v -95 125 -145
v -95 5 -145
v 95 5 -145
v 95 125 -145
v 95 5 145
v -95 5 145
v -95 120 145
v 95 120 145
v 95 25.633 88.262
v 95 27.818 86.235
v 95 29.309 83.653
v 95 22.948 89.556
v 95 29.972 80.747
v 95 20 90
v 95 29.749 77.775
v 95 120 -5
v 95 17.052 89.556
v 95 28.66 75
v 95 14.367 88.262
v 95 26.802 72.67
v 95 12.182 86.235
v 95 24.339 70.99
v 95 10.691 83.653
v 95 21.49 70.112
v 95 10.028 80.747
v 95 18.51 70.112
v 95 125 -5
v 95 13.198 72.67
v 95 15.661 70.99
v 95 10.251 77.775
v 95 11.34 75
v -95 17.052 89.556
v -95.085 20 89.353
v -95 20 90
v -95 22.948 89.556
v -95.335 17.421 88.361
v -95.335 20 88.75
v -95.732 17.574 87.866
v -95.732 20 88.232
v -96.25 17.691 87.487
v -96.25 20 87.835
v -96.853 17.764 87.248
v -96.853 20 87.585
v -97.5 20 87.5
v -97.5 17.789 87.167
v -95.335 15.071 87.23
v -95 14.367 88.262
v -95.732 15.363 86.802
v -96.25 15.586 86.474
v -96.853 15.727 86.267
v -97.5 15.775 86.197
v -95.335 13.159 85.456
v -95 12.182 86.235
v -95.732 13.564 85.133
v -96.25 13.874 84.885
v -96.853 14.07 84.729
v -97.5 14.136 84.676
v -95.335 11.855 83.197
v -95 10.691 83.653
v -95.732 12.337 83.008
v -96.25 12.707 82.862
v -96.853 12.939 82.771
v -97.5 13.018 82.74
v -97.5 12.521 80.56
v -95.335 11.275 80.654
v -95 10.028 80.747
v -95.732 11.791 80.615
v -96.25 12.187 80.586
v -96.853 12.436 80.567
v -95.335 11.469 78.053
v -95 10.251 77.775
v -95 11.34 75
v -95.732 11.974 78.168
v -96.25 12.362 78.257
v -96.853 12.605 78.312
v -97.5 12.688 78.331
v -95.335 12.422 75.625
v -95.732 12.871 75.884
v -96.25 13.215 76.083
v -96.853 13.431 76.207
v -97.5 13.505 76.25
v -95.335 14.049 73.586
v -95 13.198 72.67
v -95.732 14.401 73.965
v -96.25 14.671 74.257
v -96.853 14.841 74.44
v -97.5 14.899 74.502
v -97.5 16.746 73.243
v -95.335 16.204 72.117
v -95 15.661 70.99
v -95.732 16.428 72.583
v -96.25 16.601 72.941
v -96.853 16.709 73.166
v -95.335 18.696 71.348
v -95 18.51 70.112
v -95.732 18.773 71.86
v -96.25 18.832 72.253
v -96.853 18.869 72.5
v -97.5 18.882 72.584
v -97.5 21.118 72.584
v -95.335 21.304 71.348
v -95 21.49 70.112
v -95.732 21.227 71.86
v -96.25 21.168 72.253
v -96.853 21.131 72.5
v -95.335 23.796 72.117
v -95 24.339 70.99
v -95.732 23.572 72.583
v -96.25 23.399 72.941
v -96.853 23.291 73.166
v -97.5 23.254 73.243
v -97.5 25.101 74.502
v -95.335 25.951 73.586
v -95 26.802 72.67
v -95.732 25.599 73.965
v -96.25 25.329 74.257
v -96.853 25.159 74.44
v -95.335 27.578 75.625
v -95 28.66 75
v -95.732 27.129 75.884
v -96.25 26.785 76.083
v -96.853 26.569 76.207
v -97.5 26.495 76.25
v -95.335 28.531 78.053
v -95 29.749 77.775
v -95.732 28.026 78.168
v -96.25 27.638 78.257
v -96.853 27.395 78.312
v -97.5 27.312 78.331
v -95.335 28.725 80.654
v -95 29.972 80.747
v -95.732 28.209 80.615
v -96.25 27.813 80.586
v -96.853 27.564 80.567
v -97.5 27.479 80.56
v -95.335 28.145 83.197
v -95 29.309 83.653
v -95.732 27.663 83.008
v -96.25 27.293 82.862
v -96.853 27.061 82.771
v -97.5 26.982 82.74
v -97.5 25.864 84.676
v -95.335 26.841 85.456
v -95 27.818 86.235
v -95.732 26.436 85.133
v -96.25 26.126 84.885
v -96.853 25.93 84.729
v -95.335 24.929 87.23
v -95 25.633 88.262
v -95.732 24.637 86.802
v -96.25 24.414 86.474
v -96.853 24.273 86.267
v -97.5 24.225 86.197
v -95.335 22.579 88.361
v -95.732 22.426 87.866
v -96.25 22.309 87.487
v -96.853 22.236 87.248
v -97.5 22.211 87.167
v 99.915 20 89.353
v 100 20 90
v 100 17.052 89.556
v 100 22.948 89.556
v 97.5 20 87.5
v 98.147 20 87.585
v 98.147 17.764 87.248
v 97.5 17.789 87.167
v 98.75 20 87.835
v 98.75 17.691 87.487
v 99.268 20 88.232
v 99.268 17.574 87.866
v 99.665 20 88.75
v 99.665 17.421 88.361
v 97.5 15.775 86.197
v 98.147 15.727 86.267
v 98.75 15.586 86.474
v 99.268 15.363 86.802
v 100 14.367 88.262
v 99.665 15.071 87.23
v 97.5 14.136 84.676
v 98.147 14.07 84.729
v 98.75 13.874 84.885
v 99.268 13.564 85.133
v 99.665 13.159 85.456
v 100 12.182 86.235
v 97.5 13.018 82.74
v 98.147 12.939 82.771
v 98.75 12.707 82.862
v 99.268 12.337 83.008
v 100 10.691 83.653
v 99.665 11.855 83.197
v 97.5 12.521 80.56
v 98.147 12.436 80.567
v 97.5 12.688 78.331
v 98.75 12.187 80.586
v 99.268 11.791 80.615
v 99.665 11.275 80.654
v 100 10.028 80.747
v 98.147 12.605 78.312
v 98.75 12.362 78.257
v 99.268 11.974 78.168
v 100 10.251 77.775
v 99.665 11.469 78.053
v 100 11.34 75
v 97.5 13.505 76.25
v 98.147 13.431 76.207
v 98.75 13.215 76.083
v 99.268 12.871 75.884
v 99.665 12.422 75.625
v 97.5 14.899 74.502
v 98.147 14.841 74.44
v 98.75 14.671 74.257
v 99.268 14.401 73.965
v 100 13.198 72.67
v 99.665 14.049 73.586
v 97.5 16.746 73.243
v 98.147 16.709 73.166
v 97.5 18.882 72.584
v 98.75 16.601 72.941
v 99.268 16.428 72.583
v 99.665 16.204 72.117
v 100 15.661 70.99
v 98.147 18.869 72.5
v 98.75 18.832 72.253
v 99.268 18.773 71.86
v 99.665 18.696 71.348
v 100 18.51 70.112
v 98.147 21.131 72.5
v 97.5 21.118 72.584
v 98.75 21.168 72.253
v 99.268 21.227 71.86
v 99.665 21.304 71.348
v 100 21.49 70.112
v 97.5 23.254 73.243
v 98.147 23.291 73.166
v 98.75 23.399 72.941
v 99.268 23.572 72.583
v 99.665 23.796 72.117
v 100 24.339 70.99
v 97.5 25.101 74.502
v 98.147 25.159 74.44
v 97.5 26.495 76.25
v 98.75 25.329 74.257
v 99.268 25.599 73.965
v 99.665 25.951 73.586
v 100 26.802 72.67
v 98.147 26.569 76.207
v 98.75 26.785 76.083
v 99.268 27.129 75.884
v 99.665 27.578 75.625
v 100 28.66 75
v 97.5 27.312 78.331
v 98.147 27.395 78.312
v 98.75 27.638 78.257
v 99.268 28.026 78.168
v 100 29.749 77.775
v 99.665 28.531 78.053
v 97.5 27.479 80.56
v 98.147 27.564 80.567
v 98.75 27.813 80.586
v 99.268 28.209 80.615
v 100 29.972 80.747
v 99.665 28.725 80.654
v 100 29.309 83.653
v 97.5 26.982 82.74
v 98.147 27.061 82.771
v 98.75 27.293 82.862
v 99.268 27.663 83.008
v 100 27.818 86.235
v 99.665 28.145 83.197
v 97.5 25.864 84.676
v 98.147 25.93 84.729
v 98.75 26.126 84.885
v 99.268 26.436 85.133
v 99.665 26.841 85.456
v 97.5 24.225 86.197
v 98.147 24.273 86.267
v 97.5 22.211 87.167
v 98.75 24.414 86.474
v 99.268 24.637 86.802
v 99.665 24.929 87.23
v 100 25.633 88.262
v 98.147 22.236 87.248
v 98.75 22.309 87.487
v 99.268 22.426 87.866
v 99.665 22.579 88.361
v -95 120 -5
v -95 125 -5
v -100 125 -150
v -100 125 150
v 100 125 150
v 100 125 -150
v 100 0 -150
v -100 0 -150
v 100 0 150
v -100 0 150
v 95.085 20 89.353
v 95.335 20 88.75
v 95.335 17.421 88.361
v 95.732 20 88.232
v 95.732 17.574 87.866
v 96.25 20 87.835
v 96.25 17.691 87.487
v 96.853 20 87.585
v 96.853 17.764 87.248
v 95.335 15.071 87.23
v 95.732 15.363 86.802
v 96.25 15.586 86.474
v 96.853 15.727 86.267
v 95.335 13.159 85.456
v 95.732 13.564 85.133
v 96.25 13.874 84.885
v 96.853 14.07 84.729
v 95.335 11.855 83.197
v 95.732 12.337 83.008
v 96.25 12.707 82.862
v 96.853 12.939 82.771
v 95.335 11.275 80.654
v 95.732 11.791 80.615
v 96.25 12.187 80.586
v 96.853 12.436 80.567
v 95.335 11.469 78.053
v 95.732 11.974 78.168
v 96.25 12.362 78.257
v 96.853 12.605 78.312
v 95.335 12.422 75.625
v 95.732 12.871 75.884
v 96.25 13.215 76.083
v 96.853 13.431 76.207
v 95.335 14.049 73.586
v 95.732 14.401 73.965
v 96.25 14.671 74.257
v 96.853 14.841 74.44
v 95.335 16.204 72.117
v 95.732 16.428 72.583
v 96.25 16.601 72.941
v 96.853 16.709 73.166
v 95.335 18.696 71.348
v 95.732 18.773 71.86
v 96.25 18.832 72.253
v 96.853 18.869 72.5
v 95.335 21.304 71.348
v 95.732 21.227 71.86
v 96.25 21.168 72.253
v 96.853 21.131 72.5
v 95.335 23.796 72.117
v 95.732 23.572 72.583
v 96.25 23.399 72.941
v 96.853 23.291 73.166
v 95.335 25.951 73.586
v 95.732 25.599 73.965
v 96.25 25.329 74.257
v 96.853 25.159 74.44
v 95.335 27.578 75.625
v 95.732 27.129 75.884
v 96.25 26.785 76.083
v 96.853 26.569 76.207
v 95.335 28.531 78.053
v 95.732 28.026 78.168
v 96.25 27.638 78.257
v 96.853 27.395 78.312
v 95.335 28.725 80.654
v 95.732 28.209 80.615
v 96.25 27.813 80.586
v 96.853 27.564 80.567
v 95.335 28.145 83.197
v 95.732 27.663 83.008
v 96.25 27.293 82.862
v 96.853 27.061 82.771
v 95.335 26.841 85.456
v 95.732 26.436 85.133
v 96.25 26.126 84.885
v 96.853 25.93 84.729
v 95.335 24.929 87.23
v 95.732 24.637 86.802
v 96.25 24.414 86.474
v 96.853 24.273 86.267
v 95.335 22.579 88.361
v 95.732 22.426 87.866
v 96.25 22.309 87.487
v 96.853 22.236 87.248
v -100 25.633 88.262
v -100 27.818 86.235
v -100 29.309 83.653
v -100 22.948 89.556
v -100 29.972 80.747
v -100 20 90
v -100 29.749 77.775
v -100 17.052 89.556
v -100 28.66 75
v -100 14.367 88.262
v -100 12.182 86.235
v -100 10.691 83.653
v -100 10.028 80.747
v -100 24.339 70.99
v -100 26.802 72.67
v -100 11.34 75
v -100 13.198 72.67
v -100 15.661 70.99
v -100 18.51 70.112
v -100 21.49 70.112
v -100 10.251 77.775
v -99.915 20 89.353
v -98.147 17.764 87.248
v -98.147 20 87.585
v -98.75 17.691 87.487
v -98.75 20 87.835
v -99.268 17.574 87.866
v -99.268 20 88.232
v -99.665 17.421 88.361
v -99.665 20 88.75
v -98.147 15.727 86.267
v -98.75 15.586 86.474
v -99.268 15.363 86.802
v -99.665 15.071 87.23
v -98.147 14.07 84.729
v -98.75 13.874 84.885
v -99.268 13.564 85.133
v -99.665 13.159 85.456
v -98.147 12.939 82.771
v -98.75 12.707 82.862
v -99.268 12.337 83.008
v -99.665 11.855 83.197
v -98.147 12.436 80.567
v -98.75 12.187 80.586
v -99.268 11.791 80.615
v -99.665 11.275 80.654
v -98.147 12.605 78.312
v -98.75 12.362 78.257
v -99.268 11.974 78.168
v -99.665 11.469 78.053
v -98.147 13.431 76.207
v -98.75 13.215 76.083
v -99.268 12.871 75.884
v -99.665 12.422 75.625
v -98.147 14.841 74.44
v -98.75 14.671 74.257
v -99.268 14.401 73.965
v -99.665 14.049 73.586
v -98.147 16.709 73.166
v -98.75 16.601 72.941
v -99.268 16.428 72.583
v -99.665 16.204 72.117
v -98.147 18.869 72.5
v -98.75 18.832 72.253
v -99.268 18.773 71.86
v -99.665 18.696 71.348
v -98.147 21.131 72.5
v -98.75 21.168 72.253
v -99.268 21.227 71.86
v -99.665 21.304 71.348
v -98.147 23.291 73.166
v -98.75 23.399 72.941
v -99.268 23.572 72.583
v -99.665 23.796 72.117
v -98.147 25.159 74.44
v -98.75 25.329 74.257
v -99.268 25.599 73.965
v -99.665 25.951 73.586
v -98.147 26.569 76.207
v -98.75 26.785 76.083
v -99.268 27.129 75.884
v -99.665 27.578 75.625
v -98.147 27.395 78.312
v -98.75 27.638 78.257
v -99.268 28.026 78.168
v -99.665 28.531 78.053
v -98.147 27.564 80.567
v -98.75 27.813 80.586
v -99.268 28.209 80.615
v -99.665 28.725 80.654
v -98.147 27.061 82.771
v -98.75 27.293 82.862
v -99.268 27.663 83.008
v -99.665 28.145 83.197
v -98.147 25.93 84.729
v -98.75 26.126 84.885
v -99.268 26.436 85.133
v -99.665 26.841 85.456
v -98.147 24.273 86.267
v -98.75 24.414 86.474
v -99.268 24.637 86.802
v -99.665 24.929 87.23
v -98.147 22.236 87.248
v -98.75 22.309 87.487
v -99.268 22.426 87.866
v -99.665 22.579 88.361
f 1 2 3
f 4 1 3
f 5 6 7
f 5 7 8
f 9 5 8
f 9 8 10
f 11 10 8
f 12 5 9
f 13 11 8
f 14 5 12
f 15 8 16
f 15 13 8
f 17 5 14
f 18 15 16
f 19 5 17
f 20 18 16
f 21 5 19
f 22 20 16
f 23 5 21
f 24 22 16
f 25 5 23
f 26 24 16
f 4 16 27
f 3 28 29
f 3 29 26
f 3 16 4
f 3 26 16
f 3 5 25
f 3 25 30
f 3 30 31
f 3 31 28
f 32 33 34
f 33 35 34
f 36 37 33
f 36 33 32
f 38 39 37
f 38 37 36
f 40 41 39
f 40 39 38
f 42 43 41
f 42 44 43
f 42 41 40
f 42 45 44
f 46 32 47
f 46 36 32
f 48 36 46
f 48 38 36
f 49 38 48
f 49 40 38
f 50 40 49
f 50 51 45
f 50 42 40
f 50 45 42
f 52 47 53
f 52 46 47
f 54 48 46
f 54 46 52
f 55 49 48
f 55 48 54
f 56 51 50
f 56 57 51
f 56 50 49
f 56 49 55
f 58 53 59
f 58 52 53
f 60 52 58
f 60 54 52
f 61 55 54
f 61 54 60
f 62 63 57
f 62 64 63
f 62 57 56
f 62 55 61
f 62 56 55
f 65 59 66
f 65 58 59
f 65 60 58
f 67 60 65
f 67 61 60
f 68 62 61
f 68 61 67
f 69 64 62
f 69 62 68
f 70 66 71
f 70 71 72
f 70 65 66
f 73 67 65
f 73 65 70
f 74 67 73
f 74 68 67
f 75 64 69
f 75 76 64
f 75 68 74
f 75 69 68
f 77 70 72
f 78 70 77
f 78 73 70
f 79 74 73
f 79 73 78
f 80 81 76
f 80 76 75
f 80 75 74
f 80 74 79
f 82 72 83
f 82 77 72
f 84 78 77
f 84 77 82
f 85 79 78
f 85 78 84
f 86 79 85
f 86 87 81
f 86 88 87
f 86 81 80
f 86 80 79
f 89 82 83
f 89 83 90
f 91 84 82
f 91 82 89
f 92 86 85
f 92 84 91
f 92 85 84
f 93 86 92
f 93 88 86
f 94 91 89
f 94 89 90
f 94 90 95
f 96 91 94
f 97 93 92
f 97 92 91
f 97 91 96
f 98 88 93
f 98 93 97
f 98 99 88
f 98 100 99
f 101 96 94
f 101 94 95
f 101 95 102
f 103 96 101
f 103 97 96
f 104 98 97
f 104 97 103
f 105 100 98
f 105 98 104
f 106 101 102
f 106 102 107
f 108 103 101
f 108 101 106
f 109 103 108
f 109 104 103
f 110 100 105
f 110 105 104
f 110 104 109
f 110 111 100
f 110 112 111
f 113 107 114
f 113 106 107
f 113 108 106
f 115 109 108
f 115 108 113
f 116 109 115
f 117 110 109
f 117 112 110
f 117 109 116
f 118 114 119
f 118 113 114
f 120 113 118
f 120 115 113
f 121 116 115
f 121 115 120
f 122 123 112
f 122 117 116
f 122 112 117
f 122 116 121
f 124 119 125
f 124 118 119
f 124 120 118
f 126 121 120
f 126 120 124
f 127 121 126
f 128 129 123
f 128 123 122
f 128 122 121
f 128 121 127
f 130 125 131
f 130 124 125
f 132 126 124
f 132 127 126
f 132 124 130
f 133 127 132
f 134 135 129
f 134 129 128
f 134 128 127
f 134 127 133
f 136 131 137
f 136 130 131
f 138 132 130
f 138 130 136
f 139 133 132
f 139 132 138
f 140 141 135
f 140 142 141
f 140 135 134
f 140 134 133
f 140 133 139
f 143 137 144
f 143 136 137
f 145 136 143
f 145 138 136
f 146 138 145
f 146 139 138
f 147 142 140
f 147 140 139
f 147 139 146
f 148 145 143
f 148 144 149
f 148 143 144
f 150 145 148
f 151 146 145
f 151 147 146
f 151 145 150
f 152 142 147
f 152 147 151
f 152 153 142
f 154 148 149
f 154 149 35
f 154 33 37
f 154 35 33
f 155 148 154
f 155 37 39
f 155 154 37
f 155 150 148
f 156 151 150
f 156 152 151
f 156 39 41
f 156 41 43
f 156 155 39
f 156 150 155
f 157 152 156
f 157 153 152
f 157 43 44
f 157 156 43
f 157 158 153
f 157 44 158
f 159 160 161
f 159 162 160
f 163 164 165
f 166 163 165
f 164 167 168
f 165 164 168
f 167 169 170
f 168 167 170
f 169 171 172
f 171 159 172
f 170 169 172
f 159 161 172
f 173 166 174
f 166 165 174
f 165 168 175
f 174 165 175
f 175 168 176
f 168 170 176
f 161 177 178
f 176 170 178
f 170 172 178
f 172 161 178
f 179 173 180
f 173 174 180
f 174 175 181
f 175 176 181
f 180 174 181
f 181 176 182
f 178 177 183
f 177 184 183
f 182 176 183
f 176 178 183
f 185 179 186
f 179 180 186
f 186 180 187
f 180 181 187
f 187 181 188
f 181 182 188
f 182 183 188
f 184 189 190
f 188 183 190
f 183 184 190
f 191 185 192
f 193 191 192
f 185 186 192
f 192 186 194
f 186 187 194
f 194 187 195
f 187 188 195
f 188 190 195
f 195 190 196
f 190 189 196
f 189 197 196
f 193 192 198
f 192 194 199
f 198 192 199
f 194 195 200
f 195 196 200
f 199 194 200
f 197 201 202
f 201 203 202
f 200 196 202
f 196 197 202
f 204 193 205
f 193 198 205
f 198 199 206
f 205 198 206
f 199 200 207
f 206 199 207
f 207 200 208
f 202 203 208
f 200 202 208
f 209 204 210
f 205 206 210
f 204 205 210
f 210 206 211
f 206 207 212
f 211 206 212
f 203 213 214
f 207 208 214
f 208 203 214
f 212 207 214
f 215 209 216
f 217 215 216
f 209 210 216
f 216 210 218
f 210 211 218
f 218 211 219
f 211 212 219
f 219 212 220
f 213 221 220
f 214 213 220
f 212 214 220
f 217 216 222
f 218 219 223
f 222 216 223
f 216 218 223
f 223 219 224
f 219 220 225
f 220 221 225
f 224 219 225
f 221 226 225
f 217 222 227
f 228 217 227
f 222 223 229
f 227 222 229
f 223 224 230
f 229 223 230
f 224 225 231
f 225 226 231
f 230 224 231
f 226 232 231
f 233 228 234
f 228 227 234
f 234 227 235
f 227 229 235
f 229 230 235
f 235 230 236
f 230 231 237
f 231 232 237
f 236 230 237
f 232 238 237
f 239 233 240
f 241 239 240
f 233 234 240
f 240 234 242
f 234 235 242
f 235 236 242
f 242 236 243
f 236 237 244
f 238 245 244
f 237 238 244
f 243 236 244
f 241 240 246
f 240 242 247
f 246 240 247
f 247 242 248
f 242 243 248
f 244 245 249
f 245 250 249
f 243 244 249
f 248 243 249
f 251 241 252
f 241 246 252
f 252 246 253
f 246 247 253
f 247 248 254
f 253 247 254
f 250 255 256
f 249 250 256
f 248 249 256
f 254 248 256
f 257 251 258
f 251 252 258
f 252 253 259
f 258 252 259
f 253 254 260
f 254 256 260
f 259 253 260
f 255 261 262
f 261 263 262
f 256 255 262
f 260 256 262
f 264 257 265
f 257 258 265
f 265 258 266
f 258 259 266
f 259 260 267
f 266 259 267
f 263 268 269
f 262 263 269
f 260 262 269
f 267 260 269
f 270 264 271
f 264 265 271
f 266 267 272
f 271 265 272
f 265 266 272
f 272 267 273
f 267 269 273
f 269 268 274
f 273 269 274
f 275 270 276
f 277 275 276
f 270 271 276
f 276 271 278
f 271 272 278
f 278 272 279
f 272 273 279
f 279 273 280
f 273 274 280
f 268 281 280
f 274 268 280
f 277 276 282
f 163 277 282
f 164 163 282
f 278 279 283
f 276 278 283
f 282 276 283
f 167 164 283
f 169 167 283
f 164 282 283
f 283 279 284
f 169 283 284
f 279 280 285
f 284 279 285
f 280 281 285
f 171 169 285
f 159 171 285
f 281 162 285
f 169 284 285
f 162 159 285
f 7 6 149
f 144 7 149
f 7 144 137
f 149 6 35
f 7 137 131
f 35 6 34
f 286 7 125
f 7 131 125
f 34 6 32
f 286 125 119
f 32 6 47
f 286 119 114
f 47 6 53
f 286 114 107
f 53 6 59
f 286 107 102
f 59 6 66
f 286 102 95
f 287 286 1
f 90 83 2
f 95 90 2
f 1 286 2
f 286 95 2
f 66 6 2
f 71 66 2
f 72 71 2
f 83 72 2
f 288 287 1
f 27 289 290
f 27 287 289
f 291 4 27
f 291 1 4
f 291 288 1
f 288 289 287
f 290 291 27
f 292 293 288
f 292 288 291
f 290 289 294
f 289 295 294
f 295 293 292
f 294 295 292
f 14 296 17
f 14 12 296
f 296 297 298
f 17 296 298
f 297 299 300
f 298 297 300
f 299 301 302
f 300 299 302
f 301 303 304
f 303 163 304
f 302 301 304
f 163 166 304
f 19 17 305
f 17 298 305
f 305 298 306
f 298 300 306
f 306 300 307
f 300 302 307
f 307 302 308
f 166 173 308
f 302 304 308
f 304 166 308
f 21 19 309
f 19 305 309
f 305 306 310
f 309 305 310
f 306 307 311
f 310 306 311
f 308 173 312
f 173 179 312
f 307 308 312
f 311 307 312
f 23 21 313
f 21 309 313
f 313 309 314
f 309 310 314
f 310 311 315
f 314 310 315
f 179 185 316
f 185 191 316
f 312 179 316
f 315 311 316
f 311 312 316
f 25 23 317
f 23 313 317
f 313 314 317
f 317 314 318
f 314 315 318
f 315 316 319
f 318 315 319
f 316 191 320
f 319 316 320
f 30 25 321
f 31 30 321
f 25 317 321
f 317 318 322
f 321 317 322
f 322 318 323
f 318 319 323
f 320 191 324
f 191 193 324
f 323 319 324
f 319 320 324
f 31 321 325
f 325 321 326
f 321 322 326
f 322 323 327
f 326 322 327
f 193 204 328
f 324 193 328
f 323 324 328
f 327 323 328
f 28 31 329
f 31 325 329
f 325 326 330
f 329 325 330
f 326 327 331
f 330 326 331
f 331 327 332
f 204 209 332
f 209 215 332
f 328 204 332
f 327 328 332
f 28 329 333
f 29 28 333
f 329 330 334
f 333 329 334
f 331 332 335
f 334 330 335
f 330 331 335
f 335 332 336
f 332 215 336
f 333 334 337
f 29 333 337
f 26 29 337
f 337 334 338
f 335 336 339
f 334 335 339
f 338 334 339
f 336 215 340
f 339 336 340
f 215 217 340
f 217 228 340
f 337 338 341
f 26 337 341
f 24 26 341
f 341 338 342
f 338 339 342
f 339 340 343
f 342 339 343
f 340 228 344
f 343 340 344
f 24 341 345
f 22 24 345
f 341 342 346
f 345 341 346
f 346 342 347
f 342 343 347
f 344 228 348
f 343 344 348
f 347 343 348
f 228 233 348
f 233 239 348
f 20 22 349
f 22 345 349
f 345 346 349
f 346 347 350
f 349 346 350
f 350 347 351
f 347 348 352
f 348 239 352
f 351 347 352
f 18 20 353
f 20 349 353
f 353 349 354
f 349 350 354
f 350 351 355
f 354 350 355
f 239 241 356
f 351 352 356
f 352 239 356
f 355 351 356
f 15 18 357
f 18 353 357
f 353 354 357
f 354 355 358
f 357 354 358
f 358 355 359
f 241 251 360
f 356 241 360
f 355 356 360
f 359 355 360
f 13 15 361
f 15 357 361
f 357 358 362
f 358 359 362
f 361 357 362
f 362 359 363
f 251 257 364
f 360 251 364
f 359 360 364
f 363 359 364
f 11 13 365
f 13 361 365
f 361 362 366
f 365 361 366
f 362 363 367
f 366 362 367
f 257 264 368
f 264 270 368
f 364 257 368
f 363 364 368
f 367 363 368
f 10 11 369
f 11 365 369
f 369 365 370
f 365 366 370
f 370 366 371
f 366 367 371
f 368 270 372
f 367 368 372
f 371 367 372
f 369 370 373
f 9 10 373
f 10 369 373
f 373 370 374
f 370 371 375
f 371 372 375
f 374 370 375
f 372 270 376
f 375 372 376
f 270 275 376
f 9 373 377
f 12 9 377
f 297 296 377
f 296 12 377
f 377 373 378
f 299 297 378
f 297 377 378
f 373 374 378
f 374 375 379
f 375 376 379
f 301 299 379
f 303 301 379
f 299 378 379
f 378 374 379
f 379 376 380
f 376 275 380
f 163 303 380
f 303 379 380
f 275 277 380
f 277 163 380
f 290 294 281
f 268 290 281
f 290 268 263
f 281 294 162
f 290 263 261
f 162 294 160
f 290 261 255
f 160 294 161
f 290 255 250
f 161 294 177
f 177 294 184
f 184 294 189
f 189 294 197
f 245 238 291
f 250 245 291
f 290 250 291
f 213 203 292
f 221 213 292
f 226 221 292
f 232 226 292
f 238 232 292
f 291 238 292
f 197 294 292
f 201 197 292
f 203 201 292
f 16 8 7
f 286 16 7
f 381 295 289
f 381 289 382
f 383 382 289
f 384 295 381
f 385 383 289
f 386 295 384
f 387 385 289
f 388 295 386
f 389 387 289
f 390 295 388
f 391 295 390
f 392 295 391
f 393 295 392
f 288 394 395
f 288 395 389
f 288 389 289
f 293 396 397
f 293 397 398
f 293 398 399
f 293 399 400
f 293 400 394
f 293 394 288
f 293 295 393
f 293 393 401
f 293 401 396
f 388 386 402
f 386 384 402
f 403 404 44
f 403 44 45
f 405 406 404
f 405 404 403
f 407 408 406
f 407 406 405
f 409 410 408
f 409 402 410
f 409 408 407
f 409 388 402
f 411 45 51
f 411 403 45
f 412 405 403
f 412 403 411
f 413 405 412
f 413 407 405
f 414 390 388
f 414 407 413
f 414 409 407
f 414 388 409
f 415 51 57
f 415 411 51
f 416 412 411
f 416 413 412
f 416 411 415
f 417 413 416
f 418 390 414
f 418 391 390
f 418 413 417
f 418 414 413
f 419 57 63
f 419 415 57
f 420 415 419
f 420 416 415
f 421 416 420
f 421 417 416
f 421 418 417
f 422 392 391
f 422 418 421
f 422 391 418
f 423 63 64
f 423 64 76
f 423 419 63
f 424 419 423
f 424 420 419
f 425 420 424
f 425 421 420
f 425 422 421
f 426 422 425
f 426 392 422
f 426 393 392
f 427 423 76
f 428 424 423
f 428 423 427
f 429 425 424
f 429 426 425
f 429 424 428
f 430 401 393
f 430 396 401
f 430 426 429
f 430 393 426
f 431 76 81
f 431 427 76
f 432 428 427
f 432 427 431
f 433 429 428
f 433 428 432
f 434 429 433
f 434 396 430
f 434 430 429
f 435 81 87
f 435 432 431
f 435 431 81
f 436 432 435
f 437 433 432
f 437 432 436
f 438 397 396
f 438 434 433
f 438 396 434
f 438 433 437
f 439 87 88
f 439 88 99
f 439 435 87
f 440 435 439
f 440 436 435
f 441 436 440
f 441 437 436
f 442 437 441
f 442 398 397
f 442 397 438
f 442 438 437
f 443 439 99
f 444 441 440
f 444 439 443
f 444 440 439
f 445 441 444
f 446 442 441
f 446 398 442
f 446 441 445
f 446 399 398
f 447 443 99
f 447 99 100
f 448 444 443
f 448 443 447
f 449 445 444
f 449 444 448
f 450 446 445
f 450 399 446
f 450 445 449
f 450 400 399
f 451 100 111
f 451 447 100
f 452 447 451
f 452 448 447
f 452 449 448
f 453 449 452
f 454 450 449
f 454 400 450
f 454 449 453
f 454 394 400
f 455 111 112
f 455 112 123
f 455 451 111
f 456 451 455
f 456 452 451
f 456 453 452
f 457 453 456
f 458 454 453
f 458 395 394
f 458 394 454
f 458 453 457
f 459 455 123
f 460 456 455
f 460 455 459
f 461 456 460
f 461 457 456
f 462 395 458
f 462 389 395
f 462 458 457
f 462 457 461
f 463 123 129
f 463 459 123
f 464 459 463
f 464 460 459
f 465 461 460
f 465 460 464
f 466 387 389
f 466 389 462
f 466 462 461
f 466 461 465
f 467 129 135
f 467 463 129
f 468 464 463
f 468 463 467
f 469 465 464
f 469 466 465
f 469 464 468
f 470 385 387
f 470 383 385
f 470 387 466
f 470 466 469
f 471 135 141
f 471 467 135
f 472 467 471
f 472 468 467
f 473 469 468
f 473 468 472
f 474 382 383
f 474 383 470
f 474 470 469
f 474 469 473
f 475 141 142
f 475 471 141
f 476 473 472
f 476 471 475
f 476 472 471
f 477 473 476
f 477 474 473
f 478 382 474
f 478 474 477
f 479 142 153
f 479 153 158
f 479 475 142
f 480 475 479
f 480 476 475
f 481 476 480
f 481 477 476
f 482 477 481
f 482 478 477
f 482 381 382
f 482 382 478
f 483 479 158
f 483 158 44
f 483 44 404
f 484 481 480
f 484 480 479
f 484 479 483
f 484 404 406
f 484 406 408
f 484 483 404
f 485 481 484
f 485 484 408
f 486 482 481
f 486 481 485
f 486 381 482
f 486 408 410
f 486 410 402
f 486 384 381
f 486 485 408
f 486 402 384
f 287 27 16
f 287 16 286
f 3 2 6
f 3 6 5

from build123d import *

# Parameters (mm, degrees)
SKETCH2_W           = 200
SKETCH2_H           = 300
BOSS_EXTRUDE1_DEPTH = 5
SKETCH4_W           = 200
SKETCH4_H           = 300
SKETCH4_W_2         = 190
SKETCH4_H_2         = 290
BOSS_EXTRUDE2_DEPTH = 120
SKETCH5_W           = 190
SKETCH5_H           = 5
BOSS_EXTRUDE3_DEPTH = 150
SKETCH7_R           = 7.5
CUT_EXTRUDE1_DEPTH  = 215
FILLET4_R           = 2.5


with BuildPart() as part:
    # Sketch2 → Boss-Extrude1 (new body)
    with BuildSketch(Plane(origin=(0, 0, 0), x_dir=(1, 0, 0), z_dir=(0, 1, 0))):
        Rectangle(SKETCH2_W, SKETCH2_H)
    extrude(amount=BOSS_EXTRUDE1_DEPTH)

    # Sketch4 → Boss-Extrude2 (add)
    with BuildSketch(Plane(origin=(0, 5, 0), x_dir=(1, 0, 0), z_dir=(0, 1, 0))):
        Rectangle(SKETCH4_W, SKETCH4_H)
        Rectangle(SKETCH4_W_2, SKETCH4_H_2, mode=Mode.SUBTRACT)
    extrude(amount=BOSS_EXTRUDE2_DEPTH)

    # Sketch5 → Boss-Extrude3 (add)
    with BuildSketch(Plane(origin=(0, 0, 145), x_dir=(-1, 0, 0), z_dir=(0, 0, -1))):
        with Locations((0, 122.5)):
            Rectangle(SKETCH5_W, SKETCH5_H)
    extrude(amount=BOSS_EXTRUDE3_DEPTH)

    # Sketch7 → Cut-Extrude1 (cut, symmetric)
    with BuildSketch(Plane(origin=(-95, 0, 0), x_dir=(0, 0, -1), z_dir=(1, 0, 0))):
        with Locations(Location((-80, 20, 0), (0, 0, 180))):
            Circle(SKETCH7_R)
    extrude(amount=CUT_EXTRUDE1_DEPTH, both=True, mode=Mode.SUBTRACT)

    # Fillet4
    fillet4_edges = [part.edges().sort_by_distance(p)[0] for p in [
        (95, 20, 72.5),
        (-95, 20, 72.5),
        (-100, 20, 72.5),
        (100, 20, 72.5),
    ]]
    fillet(fillet4_edges, radius=FILLET4_R - 0.0001)  # a hair under: the kernel refuses the full size


solid = part.part
